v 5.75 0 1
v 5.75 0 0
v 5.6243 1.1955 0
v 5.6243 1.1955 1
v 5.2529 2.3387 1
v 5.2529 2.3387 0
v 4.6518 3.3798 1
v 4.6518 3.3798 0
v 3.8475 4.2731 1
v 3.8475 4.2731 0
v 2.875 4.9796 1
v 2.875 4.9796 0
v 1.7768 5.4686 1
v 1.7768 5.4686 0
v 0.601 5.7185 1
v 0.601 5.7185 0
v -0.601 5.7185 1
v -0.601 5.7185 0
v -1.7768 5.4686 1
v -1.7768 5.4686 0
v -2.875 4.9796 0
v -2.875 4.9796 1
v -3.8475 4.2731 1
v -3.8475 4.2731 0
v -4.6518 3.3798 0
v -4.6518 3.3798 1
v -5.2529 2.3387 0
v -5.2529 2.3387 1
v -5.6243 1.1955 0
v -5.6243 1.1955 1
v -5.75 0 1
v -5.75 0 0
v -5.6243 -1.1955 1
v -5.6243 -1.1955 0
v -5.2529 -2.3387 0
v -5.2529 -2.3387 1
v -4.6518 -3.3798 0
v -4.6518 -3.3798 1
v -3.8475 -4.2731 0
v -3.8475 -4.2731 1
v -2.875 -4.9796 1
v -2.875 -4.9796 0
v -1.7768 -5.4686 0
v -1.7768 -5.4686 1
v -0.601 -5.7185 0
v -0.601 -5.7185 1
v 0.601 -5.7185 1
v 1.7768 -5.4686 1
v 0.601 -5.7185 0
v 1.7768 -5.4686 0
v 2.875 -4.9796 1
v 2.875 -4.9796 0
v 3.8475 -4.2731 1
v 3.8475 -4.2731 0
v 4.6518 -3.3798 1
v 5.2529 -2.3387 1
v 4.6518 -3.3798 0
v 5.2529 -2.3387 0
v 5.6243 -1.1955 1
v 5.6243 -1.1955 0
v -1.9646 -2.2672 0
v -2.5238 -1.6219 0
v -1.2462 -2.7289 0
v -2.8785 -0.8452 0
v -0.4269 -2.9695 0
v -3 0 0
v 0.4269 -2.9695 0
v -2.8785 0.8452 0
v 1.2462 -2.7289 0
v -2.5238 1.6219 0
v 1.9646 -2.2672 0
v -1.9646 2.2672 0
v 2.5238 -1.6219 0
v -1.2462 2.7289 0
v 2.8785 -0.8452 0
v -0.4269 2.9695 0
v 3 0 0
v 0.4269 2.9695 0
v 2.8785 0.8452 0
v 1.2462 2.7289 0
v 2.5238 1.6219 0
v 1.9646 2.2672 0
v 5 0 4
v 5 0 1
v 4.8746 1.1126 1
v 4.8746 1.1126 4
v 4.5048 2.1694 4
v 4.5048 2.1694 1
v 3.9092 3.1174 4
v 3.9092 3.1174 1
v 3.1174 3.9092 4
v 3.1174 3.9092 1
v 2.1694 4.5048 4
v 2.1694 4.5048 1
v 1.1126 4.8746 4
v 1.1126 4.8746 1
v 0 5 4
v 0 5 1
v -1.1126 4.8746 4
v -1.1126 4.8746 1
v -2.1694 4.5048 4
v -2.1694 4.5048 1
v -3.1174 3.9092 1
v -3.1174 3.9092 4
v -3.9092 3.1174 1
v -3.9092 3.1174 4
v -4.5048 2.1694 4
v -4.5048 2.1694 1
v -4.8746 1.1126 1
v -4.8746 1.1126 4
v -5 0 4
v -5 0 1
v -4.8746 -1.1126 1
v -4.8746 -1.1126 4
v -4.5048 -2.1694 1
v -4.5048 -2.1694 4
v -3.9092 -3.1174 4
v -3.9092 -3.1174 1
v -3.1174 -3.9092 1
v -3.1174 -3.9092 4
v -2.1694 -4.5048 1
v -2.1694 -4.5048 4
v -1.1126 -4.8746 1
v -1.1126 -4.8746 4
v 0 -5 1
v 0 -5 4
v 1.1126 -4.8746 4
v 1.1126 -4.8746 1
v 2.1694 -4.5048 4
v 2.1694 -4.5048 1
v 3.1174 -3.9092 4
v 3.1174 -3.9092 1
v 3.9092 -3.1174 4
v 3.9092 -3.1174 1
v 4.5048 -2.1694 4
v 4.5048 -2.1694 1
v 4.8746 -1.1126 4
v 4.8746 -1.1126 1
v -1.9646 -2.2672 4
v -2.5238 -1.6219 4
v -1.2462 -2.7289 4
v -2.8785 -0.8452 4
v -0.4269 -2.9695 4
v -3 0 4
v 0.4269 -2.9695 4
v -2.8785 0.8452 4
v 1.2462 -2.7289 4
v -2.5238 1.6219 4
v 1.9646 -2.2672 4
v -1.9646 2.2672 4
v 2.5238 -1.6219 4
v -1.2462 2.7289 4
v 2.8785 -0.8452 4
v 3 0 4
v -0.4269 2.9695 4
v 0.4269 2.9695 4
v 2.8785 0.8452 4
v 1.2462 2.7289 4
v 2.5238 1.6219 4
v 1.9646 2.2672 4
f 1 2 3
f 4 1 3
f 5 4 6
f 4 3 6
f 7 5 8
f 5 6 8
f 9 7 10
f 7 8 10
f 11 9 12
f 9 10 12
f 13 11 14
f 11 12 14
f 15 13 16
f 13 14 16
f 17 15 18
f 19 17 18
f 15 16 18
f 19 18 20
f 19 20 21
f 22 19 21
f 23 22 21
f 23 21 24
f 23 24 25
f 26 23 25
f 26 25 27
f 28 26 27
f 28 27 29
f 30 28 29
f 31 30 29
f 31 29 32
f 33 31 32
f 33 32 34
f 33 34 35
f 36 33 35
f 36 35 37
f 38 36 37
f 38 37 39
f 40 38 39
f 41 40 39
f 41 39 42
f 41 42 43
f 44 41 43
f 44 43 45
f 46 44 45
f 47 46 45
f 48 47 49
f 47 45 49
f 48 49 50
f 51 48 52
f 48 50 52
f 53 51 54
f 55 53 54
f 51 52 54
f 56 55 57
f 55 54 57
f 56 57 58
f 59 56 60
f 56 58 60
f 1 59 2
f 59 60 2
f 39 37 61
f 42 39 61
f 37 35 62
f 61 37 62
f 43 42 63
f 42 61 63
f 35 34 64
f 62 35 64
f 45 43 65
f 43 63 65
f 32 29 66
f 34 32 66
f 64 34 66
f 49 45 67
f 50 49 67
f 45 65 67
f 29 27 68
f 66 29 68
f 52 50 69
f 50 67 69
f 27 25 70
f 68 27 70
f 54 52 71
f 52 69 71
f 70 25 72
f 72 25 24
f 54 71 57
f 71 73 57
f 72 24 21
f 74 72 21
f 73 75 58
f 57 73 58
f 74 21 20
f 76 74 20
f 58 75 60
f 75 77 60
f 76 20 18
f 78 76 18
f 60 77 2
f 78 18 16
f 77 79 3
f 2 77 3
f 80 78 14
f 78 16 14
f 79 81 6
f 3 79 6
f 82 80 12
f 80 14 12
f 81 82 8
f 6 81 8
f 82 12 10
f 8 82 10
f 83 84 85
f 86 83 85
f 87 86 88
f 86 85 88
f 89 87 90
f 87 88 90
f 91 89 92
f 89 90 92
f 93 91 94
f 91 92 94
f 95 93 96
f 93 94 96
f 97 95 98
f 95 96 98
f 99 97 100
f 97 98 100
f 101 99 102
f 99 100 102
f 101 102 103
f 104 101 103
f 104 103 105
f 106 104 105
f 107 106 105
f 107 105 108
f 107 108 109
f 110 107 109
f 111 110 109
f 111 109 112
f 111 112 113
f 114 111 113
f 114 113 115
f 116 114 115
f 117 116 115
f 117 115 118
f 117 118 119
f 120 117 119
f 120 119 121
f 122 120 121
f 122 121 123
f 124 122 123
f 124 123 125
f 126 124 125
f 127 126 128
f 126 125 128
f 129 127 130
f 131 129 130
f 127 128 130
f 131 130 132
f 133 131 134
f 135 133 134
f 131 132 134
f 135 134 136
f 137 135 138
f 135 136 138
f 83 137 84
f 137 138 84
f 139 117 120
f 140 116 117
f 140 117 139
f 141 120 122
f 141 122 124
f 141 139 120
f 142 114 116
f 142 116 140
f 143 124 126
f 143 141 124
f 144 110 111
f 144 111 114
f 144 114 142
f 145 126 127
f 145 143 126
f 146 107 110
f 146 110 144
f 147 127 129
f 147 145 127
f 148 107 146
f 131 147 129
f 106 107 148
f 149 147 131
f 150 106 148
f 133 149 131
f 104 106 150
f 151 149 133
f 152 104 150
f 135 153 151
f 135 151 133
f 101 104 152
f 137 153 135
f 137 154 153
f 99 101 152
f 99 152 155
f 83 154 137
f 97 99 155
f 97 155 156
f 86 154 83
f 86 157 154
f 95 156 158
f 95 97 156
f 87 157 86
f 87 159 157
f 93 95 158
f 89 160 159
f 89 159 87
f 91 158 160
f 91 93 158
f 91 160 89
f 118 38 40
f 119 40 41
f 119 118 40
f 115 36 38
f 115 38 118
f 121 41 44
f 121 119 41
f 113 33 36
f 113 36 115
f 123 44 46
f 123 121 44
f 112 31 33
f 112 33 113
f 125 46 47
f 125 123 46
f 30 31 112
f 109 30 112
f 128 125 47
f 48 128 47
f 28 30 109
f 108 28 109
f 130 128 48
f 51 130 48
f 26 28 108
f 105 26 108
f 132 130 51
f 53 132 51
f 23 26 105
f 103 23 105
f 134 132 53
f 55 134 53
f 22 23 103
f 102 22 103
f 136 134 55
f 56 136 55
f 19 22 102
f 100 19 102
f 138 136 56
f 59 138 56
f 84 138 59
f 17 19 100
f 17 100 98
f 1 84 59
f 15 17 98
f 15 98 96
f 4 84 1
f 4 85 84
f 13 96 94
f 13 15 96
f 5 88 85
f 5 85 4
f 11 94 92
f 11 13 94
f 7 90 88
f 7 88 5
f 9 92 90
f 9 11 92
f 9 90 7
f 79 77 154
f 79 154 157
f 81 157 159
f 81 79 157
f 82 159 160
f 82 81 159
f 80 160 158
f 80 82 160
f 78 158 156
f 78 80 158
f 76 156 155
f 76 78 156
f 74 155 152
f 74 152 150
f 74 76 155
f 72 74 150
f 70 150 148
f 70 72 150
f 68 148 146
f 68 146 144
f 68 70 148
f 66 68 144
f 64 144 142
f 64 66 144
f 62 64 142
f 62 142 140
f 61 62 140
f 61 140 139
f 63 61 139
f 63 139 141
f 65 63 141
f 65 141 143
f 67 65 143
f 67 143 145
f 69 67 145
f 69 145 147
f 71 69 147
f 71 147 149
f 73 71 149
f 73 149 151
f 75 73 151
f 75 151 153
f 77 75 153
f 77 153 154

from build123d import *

# Parameters (mm, degrees)
SKETCH_1_R          = 5
SKETCH_1_R_2        = 3
EXTRUDE_1_DEPTH     = 4
SKETCH_2_R          = 5.75
EXTRUDE_2_DEPTH     = 0.9
SKETCH_3_R          = 3
CUT_EXTRUDE_2_DEPTH = 9.9
SKETCH_2_2_R        = 5.75
EXTRUDE_3_DEPTH     = 1
SKETCH_3_2_R        = 3
CUT_EXTRUDE_3_DEPTH = 7


with BuildPart() as part:
    # 草图1 → 凸台-拉伸1 (new body)
    with BuildSketch(Plane.XY):
        Circle(SKETCH_1_R)
        Circle(SKETCH_1_R_2, mode=Mode.SUBTRACT)
    extrude(amount=EXTRUDE_1_DEPTH)

    # 草图2 → 凸台-拉伸2 (add)
    with BuildSketch(Plane.XY):
        Circle(SKETCH_2_R)
    extrude(amount=EXTRUDE_2_DEPTH)

    # 草图3 → 切除-拉伸2 (cut)
    with BuildSketch(Plane.XY):
        Circle(SKETCH_3_R)
    extrude(amount=CUT_EXTRUDE_2_DEPTH, mode=Mode.SUBTRACT)

    # 草图2<2> → 凸台-拉伸3 (add)
    with BuildSketch(Plane.XY):
        Circle(SKETCH_2_2_R)
    extrude(amount=EXTRUDE_3_DEPTH)

    # 草图3<2> → 切除-拉伸3 (cut)
    with BuildSketch(Plane.XY):
        Circle(SKETCH_3_2_R)
    extrude(amount=CUT_EXTRUDE_3_DEPTH, mode=Mode.SUBTRACT)


solid = part.part
